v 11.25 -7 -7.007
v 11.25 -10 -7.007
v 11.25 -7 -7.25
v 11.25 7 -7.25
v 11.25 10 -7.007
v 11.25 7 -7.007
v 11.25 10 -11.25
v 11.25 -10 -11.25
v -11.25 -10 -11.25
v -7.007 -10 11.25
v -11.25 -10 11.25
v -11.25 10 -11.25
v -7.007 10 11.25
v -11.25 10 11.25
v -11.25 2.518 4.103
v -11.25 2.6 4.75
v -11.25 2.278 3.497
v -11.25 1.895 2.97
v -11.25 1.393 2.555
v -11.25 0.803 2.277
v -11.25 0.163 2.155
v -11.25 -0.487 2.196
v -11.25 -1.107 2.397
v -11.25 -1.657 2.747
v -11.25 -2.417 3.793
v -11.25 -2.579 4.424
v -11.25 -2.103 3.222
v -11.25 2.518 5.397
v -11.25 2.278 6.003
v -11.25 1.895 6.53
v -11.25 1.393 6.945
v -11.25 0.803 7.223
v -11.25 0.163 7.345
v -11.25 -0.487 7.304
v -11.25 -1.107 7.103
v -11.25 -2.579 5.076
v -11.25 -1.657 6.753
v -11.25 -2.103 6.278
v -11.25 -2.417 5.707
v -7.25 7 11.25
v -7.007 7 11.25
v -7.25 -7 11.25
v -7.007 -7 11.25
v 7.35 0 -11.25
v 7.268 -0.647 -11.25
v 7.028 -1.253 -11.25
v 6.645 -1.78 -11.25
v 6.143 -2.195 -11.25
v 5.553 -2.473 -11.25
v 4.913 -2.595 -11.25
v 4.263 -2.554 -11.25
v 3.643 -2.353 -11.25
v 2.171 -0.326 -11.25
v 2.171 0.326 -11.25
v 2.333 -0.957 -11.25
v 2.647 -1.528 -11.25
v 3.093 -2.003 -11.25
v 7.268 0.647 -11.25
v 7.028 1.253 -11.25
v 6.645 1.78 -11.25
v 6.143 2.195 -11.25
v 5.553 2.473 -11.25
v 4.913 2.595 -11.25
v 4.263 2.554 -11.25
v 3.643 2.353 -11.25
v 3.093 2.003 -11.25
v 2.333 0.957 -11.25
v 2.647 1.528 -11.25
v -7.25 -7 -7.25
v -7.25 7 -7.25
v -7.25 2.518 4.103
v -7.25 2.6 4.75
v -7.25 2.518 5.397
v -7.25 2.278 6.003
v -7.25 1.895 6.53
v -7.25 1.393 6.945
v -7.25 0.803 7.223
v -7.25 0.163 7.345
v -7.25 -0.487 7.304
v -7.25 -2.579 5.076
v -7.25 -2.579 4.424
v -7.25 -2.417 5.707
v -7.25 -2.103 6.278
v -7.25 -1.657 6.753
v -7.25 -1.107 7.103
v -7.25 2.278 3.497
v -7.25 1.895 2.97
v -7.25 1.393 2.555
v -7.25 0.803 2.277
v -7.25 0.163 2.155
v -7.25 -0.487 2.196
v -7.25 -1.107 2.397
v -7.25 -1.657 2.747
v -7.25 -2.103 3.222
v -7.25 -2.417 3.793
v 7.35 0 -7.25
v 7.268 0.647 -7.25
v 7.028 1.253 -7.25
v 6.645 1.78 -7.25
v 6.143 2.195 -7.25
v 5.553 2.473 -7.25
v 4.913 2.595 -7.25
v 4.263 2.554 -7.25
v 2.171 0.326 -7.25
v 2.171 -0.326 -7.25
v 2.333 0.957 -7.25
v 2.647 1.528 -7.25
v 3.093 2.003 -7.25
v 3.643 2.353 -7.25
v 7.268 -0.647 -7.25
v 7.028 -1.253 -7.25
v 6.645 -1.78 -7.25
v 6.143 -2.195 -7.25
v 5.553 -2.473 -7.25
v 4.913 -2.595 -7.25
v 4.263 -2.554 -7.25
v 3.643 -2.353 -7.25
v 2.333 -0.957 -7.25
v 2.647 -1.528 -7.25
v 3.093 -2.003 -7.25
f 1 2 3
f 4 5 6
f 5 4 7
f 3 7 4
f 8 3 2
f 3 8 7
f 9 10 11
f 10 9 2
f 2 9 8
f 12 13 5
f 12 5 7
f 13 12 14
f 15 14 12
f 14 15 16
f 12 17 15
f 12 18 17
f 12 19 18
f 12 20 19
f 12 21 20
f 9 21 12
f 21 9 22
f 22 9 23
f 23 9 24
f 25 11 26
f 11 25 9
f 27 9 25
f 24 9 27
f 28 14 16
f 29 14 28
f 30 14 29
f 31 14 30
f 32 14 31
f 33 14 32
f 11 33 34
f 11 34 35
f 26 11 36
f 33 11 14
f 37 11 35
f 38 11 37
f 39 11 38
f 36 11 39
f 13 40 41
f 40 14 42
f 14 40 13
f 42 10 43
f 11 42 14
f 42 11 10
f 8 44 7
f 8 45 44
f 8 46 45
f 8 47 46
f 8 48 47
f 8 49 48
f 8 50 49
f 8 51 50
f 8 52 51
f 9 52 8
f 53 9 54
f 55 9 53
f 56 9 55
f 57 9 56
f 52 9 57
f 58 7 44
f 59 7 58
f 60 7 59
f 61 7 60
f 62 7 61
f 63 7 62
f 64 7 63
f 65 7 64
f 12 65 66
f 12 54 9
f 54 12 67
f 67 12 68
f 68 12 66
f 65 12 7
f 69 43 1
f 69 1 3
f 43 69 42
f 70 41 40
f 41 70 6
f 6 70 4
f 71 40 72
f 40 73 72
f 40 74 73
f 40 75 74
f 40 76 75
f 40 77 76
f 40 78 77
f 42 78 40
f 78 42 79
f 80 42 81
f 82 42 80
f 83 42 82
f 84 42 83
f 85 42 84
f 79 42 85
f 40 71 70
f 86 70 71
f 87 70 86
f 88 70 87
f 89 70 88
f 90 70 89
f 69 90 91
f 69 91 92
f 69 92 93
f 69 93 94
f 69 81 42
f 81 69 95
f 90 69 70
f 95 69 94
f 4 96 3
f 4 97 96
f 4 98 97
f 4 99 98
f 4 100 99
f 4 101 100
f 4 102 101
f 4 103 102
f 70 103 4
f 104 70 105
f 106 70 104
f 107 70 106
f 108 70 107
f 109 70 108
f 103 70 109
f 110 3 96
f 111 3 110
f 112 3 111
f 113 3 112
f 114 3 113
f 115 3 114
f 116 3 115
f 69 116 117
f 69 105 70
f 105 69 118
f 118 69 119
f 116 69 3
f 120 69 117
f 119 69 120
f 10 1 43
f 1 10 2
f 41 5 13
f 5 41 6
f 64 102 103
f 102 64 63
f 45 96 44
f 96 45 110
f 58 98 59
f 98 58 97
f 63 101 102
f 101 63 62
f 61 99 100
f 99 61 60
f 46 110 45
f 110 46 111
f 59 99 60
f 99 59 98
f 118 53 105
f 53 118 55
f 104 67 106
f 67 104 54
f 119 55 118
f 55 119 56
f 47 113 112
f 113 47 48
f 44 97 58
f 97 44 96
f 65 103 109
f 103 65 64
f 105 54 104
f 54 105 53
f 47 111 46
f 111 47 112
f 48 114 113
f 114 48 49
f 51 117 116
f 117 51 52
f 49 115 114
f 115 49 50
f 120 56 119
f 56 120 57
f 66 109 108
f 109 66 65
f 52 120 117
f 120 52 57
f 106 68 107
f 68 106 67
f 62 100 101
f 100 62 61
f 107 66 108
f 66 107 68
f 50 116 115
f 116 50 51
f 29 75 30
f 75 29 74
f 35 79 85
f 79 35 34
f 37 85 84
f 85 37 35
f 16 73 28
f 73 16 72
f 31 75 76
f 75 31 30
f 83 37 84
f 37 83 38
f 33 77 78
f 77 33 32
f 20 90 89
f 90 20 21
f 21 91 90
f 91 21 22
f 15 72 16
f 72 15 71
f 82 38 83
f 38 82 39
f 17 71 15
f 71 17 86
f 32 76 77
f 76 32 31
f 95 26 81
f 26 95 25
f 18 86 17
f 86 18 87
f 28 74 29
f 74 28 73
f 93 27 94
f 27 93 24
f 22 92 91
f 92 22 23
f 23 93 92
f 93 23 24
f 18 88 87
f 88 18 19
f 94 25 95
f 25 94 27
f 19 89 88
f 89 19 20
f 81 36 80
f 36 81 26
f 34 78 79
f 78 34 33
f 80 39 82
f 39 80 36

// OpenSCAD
module 90BracketMin(){

// 90 degree bracket
// modifié par X. HINAULT - www.mon-club-elec.fr

$fn = 25;
length = 22.5;
width = 20;
walls = 3;

rHole = 2.6;

rotate([90, 0, 0])
difference()
{
    cube([length, length, width], center=true);
    
    translate([4, 4, 0])
    cube([length, length, width-(walls * 2)], center=true);
    
    rotate([0,0,45])
    translate([length/2 + 3, 0, 0])
    cube([length, length + 20, width+2], center= true);
    
    // bottom screw holes
    //translate([length/2 - 8, -length/2 + 5, 0])
    //rotate([90, 0, 0])
    //#cylinder(r=rHole, h=10);

    translate([-length/2 + 16, -length/2 + 5, 0])
    rotate([90, 0, 0])
    #cylinder(r=rHole, h=10);
    
    
    // side screw holes
    //translate([-length/2 - 5, length/2 - 8, 0])
    //rotate([0, 90, 0])
    //#cylinder(r=rHole, h=10);

    translate([-length/2 - 5, -length/2 + 16, 0])
    rotate([0, 90, 0])
    #cylinder(r=rHole, h=10);
}

} // fin module 

90BracketMin();
